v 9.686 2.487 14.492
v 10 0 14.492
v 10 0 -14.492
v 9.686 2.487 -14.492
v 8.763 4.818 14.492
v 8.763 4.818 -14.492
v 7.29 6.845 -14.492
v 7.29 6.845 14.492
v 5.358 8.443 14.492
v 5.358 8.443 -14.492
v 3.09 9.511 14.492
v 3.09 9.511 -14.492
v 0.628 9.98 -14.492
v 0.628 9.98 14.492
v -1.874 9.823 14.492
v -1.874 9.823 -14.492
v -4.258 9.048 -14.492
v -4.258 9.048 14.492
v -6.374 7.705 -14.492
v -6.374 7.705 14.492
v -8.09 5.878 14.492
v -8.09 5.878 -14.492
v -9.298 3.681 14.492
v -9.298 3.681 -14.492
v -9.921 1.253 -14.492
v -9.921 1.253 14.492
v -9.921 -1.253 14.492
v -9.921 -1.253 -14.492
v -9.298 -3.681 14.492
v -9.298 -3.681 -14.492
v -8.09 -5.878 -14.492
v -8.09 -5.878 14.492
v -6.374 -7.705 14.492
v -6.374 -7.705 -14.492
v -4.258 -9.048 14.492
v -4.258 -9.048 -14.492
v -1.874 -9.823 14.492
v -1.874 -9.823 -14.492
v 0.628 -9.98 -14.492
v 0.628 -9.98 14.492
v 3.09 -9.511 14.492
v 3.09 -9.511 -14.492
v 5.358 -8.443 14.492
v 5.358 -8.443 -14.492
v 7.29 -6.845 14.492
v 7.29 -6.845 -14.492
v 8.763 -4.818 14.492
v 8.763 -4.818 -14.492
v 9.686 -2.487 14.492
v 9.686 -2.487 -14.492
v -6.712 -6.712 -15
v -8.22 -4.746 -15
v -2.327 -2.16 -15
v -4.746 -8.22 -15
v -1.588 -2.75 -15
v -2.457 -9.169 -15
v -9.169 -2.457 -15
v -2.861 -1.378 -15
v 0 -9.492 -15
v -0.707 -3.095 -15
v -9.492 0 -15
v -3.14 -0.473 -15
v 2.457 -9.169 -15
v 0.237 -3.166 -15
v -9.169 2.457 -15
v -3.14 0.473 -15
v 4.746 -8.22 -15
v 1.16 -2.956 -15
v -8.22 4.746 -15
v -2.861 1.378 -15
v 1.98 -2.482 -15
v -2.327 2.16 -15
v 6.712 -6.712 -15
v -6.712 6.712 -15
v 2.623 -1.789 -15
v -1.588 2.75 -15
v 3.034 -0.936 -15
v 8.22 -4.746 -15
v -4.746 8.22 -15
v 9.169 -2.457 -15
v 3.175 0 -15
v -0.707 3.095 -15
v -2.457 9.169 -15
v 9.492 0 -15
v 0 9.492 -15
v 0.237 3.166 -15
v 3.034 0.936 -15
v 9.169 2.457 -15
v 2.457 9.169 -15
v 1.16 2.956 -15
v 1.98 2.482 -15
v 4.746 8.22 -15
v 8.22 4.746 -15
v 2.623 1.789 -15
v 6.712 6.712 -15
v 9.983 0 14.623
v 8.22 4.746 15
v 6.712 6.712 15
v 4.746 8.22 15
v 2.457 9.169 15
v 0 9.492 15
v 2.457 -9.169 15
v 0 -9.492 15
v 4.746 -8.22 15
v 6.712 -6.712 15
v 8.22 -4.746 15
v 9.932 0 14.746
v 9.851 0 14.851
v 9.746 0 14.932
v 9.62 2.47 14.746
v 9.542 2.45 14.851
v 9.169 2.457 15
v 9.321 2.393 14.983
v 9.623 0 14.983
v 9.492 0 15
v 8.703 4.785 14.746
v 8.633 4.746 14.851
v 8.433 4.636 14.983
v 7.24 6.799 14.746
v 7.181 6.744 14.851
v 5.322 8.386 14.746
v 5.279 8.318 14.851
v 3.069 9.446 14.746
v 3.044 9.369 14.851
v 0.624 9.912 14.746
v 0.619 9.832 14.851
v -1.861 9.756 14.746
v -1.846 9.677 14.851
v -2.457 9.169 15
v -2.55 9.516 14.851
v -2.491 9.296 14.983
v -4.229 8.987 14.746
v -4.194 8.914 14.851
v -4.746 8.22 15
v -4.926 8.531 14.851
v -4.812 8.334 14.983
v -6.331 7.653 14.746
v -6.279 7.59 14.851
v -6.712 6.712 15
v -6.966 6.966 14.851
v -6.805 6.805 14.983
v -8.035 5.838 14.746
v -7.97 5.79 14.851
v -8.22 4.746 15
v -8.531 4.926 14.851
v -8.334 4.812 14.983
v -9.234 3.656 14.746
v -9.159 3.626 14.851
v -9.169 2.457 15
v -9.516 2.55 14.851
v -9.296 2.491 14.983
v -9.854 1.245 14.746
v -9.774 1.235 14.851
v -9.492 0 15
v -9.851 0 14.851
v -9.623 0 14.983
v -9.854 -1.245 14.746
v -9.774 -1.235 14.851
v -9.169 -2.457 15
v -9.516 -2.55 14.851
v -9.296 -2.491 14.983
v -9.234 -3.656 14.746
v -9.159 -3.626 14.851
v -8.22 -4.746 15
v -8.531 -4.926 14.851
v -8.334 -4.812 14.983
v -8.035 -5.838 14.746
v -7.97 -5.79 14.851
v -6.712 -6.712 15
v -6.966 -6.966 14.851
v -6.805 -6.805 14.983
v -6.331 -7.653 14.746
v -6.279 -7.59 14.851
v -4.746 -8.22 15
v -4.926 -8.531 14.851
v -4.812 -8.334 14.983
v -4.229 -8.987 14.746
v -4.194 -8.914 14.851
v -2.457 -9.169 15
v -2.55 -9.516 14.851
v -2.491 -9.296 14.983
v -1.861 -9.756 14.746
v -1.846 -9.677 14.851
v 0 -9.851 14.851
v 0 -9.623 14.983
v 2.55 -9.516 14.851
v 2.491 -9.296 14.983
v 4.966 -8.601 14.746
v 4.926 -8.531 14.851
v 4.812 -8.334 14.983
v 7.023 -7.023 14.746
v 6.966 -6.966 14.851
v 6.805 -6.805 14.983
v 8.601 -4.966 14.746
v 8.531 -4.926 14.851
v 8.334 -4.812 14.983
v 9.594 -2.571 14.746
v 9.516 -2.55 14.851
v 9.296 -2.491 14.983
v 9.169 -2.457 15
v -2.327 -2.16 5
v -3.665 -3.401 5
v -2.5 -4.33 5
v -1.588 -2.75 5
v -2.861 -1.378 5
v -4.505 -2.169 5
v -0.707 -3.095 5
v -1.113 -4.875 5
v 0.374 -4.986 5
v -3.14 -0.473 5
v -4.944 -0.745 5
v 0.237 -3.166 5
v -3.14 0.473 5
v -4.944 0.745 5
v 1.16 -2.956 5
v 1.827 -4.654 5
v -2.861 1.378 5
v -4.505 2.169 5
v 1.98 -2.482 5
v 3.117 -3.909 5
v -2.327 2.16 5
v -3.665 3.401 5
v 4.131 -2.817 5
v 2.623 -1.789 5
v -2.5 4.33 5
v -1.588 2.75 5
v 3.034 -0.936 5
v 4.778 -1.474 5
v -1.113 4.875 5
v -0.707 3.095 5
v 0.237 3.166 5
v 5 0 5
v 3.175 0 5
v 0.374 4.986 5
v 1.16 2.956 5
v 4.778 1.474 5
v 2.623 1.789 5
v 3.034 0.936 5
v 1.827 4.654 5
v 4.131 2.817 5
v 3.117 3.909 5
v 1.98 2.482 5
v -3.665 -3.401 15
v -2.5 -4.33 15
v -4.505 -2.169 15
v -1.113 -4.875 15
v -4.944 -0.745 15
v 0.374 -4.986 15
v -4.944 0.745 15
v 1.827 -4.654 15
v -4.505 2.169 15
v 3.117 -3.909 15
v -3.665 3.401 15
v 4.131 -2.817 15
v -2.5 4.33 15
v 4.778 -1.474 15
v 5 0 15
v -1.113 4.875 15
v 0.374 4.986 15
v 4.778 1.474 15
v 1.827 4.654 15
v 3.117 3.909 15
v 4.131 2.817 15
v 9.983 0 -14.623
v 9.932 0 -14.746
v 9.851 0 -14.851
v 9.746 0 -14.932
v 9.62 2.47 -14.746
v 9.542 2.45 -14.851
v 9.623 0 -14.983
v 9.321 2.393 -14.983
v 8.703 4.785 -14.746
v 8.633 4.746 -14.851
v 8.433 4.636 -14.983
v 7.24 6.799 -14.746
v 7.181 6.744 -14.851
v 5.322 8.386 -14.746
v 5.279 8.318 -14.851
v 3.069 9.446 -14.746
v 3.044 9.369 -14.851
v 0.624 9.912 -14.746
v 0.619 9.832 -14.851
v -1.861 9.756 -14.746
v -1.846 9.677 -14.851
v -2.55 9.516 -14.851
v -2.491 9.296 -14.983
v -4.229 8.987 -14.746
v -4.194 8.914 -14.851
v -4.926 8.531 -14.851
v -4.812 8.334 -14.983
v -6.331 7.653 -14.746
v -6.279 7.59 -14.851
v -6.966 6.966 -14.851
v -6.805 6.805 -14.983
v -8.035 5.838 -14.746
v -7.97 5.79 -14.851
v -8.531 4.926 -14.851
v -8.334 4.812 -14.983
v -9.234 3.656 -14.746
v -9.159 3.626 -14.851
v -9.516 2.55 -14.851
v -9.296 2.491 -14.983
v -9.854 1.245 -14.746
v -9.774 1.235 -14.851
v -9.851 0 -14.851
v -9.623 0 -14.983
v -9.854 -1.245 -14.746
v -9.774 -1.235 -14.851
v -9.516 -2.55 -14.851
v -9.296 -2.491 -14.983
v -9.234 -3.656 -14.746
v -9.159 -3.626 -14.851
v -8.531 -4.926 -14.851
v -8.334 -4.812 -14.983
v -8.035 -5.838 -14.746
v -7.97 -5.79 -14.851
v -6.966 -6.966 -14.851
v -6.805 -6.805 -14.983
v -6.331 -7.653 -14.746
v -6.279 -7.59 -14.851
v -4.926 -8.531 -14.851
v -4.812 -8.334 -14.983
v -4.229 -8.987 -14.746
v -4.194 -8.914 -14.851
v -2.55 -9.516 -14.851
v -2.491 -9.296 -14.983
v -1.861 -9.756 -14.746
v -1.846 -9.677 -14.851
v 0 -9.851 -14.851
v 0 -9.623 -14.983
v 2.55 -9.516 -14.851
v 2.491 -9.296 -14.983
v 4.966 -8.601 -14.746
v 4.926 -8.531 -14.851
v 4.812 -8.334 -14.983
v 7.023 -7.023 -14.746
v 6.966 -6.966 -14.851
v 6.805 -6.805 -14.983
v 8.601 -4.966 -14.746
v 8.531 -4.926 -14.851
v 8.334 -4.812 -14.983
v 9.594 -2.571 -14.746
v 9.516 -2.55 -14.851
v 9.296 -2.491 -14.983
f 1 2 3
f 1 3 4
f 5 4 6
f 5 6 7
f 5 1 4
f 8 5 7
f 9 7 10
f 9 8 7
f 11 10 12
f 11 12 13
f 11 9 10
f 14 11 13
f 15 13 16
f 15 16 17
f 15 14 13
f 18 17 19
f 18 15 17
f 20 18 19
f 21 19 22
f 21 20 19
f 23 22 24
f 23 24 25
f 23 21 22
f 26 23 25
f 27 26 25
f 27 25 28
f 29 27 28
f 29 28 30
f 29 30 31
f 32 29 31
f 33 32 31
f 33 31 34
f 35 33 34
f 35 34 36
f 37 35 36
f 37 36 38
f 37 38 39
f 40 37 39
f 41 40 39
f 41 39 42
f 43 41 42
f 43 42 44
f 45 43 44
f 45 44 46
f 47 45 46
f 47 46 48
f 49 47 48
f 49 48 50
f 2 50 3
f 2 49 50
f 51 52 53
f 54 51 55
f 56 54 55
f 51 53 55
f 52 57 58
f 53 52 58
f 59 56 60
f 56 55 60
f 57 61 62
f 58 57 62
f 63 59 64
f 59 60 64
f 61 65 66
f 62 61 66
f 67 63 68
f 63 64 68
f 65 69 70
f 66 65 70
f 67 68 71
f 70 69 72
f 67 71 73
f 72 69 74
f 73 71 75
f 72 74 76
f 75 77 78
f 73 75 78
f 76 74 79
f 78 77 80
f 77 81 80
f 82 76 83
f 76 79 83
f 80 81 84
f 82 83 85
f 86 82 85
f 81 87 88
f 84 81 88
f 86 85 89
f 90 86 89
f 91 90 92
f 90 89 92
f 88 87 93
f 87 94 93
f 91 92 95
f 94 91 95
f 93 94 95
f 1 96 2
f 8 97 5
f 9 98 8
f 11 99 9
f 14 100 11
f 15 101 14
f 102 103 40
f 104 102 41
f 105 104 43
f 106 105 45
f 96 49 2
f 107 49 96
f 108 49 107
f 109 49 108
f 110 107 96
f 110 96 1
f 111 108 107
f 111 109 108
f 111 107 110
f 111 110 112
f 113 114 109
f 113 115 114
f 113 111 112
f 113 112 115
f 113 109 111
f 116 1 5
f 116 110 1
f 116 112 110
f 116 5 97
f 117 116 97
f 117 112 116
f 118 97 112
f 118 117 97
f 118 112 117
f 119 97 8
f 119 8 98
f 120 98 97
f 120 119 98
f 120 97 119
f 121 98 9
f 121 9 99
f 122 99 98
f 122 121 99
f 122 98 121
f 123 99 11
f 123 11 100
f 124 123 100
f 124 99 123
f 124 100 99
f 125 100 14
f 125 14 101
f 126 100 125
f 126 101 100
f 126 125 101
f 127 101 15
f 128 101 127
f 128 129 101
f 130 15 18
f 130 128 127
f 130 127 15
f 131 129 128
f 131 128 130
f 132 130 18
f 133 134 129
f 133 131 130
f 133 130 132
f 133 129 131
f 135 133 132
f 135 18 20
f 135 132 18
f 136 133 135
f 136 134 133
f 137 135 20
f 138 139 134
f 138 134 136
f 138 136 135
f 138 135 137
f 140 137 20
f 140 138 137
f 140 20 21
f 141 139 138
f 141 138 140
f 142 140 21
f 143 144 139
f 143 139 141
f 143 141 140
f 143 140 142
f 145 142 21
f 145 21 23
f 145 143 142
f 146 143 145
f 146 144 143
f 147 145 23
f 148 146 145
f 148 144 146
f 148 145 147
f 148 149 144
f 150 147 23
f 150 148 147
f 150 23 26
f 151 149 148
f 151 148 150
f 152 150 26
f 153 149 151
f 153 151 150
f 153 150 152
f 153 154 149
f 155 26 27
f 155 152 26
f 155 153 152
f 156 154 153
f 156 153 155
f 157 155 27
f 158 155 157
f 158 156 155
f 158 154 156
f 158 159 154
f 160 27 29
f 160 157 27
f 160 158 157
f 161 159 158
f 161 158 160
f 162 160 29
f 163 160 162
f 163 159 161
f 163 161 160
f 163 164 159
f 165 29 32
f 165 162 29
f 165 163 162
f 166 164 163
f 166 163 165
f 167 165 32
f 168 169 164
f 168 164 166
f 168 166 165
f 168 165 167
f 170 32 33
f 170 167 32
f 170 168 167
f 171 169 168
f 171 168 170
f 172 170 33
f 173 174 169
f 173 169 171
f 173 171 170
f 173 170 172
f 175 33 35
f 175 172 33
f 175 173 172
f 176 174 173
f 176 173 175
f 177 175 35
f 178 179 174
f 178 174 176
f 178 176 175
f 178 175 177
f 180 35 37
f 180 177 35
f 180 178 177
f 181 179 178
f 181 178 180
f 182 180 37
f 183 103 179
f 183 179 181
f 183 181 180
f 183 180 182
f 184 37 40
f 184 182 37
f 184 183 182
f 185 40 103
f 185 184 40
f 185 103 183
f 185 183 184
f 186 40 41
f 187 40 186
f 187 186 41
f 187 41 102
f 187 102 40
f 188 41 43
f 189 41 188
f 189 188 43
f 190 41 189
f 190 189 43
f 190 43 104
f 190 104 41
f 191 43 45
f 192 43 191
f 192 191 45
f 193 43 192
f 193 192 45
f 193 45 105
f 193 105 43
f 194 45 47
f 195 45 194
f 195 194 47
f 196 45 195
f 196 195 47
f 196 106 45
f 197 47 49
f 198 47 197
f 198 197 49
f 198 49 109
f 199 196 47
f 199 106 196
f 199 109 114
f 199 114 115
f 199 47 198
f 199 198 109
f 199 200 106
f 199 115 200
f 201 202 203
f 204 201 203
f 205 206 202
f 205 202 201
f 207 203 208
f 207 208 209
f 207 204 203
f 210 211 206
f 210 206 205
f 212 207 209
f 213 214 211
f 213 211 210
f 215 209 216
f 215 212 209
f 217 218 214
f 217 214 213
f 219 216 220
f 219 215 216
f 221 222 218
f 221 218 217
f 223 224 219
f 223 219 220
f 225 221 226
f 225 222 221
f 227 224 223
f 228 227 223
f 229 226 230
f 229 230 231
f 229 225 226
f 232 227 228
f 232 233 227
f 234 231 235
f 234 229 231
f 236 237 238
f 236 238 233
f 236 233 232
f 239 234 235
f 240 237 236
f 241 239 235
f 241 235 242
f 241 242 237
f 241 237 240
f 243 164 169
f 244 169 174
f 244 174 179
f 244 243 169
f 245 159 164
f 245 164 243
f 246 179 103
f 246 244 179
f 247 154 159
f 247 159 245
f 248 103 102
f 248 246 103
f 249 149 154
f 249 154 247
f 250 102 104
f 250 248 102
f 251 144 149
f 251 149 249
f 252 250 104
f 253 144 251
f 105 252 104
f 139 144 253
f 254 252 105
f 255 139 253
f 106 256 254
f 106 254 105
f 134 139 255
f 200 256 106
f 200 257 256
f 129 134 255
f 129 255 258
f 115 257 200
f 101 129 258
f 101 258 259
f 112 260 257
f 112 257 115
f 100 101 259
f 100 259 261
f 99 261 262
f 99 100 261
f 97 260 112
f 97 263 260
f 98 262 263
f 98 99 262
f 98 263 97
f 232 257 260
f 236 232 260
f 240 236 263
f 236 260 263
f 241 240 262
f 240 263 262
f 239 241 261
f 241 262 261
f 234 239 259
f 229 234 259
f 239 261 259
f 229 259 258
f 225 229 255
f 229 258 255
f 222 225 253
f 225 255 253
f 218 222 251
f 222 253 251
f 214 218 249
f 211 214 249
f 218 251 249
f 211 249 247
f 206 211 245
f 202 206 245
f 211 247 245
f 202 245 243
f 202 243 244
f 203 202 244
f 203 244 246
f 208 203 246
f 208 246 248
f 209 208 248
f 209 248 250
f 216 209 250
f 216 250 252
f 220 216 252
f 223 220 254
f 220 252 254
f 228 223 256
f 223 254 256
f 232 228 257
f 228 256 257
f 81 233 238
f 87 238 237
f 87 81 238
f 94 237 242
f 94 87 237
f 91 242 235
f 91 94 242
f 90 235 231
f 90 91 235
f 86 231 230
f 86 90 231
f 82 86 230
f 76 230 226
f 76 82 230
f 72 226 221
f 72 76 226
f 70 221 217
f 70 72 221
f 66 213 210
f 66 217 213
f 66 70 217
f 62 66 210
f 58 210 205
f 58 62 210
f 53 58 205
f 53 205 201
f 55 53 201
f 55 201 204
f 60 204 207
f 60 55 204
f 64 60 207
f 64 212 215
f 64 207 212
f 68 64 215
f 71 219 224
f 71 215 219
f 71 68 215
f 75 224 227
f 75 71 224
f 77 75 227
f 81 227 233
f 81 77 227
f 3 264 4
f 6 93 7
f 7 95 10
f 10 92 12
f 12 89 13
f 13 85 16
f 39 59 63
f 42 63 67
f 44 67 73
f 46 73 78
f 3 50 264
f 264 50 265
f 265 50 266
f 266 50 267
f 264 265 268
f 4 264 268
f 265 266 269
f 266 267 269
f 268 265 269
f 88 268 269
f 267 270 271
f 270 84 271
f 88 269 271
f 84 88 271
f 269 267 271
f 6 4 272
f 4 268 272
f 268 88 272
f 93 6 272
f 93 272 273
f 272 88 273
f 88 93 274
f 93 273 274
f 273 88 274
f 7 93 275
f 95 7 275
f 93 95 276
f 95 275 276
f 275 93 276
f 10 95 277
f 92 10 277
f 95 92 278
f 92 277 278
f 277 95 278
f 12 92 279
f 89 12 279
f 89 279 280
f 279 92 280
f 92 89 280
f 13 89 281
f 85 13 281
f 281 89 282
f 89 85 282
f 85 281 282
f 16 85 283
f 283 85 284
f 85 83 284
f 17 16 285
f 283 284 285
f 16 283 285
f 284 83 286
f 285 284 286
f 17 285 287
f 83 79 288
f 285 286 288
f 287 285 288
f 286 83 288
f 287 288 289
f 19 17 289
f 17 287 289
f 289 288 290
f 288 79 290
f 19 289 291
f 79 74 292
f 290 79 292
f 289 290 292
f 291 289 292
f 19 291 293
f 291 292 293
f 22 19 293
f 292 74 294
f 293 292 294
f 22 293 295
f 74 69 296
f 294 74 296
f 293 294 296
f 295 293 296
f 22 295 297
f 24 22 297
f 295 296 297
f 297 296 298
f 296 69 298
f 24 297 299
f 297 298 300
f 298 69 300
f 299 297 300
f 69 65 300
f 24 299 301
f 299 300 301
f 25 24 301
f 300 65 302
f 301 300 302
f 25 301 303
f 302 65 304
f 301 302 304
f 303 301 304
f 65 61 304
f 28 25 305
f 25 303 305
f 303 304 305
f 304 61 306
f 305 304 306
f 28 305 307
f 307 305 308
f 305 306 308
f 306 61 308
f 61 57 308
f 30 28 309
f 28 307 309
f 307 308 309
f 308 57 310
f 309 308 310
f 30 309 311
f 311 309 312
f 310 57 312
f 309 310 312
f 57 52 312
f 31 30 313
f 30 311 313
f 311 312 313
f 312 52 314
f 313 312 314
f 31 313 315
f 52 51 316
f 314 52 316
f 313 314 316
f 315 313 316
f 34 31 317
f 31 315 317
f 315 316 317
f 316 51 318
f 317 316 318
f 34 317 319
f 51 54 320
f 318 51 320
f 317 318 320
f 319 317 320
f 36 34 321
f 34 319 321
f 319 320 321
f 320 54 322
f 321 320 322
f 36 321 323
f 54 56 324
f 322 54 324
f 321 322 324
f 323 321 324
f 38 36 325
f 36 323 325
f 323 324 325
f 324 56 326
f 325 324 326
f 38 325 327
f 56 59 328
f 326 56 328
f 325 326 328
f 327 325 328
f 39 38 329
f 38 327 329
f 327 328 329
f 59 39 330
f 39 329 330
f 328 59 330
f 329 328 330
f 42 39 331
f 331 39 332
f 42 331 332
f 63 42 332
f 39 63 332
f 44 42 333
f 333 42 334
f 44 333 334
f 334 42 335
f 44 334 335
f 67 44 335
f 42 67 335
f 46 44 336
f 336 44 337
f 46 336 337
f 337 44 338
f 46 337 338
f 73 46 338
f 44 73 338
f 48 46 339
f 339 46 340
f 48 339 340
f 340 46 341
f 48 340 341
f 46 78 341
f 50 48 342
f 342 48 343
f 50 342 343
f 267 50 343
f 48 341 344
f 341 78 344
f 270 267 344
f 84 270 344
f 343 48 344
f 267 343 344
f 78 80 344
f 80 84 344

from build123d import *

# Parameters (mm, degrees)
F0_R     = 10
F0_R_2   = 3.175
F1_DEPTH = 15
F2_R     = 5
F3_DEPTH = 10
F4_R     = 0.508


with BuildPart() as f1:
    # F0 (on Top) → F1 (new body, symmetric)
    with BuildSketch(Plane.XY):
        Circle(F0_R)
        Circle(F0_R_2, mode=Mode.SUBTRACT)
    extrude(amount=F1_DEPTH, both=True)

    # F2 (on face) → F3 (cut)
    with BuildSketch(Plane.XY.offset(15)):
        Circle(F2_R)
    extrude(amount=-F3_DEPTH, mode=Mode.SUBTRACT)

    # F4
    f4_edges = [f1.edges().sort_by_distance(p)[0] for p in [
        (-10, 0, 15),
        (-10, 0, -15),
    ]]
    fillet(f4_edges, radius=F4_R)


solid = f1.part
